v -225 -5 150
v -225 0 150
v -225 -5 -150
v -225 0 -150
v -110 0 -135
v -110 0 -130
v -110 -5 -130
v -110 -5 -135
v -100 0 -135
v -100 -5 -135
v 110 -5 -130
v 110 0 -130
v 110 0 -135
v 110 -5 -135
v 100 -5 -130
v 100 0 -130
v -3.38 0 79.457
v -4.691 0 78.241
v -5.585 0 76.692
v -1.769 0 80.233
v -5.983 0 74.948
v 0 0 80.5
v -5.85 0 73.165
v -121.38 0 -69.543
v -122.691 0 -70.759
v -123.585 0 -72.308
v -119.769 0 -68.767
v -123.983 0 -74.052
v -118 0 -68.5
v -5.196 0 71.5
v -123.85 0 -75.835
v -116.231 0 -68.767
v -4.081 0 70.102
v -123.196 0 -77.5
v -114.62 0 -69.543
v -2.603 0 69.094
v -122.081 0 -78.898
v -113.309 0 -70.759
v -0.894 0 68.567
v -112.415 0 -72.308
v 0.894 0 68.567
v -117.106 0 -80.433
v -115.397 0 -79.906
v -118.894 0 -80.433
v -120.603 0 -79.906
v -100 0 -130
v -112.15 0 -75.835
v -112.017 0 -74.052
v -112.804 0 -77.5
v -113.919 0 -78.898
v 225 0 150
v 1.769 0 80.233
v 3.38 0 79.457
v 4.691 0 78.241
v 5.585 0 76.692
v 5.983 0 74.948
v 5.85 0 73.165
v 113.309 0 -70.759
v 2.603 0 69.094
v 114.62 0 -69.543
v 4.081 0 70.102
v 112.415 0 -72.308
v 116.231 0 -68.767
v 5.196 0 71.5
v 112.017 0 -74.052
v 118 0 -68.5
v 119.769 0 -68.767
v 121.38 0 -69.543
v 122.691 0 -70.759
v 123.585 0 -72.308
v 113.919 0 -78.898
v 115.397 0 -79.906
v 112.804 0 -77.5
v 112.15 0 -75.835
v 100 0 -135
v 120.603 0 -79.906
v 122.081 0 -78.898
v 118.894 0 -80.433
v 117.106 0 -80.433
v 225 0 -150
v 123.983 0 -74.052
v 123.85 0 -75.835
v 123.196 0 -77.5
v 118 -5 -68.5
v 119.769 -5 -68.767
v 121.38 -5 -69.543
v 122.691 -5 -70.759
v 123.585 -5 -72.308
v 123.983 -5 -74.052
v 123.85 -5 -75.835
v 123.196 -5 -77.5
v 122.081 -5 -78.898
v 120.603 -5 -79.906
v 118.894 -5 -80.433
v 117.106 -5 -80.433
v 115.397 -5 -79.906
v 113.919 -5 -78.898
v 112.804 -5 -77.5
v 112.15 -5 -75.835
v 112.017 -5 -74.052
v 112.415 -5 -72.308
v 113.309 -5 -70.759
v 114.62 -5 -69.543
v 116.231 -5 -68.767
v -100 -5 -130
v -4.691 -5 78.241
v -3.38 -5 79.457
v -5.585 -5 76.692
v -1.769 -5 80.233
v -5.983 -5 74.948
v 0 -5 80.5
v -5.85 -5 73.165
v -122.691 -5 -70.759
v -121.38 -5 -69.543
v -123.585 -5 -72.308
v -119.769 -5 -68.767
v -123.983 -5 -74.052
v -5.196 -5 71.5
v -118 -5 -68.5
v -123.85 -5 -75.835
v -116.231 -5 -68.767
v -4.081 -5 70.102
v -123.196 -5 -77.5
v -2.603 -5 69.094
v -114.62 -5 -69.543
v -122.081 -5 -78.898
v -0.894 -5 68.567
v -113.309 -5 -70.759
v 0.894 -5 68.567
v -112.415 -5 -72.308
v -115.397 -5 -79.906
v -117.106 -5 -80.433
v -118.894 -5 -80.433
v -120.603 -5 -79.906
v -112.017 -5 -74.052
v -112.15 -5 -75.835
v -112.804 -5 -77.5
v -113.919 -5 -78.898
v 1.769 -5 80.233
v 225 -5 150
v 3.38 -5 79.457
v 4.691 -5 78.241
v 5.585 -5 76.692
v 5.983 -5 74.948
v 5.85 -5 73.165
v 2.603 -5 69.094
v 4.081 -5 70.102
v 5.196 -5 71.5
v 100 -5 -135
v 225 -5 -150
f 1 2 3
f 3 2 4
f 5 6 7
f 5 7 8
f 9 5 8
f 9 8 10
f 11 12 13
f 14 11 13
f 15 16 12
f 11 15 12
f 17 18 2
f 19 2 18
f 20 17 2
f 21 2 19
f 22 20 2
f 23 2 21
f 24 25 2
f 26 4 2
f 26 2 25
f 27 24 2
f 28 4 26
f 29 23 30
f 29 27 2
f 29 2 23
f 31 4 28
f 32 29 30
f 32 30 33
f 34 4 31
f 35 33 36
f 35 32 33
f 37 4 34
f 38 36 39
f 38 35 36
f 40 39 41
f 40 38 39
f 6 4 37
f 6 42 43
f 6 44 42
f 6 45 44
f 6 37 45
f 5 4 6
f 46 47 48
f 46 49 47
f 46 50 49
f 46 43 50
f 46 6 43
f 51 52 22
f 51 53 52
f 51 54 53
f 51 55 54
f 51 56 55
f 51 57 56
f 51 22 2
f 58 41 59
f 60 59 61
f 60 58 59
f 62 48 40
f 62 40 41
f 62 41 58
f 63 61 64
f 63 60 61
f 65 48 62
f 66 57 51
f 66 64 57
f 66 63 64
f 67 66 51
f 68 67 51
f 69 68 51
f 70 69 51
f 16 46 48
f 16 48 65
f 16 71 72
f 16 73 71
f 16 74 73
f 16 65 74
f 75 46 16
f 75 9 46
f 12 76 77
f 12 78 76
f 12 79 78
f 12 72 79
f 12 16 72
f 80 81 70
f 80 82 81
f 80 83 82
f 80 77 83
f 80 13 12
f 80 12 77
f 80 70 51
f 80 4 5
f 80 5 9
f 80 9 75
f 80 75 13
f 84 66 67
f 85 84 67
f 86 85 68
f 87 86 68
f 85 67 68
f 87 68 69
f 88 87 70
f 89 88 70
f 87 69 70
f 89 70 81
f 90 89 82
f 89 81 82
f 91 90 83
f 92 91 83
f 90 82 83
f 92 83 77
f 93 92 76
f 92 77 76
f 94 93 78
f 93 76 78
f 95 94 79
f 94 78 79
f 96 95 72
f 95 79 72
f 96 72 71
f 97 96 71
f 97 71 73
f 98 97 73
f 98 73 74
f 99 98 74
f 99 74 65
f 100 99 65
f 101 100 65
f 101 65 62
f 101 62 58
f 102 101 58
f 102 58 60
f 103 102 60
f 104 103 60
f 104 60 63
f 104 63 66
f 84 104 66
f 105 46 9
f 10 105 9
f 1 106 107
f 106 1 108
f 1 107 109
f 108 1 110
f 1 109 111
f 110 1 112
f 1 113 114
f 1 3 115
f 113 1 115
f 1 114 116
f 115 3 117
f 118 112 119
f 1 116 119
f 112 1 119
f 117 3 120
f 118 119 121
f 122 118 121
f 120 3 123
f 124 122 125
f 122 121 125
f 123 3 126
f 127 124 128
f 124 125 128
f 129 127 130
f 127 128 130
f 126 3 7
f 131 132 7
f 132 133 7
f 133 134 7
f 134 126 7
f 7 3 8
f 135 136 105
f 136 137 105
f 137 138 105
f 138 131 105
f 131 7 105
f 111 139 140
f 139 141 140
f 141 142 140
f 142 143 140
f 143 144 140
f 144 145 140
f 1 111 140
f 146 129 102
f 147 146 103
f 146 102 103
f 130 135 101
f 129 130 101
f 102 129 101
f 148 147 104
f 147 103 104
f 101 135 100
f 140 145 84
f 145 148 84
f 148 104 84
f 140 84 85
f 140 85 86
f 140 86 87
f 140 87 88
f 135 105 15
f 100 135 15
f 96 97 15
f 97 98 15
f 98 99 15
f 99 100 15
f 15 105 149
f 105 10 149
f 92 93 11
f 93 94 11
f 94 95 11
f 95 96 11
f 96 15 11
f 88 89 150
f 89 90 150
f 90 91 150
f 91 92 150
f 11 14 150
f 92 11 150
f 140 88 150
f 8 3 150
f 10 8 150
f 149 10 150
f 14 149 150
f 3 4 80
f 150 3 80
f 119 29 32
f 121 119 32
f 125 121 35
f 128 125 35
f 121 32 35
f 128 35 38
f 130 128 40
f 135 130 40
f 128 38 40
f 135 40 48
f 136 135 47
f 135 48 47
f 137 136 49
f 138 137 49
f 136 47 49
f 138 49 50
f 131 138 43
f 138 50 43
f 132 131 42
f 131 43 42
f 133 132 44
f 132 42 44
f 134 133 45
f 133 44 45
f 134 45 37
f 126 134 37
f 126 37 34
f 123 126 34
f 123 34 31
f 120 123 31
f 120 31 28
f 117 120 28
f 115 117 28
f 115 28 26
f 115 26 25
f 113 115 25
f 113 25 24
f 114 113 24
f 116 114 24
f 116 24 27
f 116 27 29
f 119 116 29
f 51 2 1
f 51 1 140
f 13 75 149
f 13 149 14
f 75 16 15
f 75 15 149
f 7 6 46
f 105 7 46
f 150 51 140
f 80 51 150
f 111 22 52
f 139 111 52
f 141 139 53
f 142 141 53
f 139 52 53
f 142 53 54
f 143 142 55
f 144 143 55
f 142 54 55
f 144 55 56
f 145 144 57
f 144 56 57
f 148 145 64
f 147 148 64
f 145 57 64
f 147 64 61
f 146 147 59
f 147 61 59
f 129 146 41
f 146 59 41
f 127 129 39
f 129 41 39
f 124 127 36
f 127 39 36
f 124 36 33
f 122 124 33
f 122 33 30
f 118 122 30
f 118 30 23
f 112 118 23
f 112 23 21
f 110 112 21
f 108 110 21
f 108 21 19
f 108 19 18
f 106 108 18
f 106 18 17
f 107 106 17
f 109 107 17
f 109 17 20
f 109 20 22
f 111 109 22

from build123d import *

# Parameters (mm, degrees)
SKETCH1_W      = 450
SKETCH1_H      = 300
EXTRUDE1_DEPTH = 5
EXTRUDE2_REACH = 272.463
SKETCH2_R      = 6
EXTRUDE3_REACH = 272.463
SKETCH3_W      = 10
SKETCH3_H      = 5


with BuildPart() as part:
    # Sketch1 → Extrude1 (new body)
    with BuildSketch(Plane(origin=(0, 0, 0), x_dir=(1, 0, 0), z_dir=(0, 1, 0))):
        Rectangle(SKETCH1_W, SKETCH1_H)
    extrude(amount=-EXTRUDE1_DEPTH)

    # Sketch2 → Extrude2 (cut, up to next)
    with BuildSketch(Plane(origin=(0, 0, 0), x_dir=(1, 0, 0), z_dir=(0, 1, 0)), mode=Mode.PRIVATE) as extrude2_sk1:
        with Locations(Location((0, -74.5, 0), (0, 0, 270))):
            Circle(SKETCH2_R)
    extrude2_tool1 = extrude(extrude2_sk1.sketch, amount=-EXTRUDE2_REACH, mode=Mode.PRIVATE) & part.part
    # Sketch2 → Extrude2 (cut, up to next)
    with BuildSketch(Plane(origin=(0, 0, 0), x_dir=(1, 0, 0), z_dir=(0, 1, 0)), mode=Mode.PRIVATE) as extrude2_sk2:
        with Locations(Location((118, 74.5, 0), (0, 0, 270))):
            Circle(SKETCH2_R)
    extrude2_tool2 = extrude(extrude2_sk2.sketch, amount=-EXTRUDE2_REACH, mode=Mode.PRIVATE) & part.part
    # Sketch2 → Extrude2 (cut, up to next)
    with BuildSketch(Plane(origin=(0, 0, 0), x_dir=(1, 0, 0), z_dir=(0, 1, 0)), mode=Mode.PRIVATE) as extrude2_sk3:
        with Locations(Location((-118, 74.5, 0), (0, 0, 270))):
            Circle(SKETCH2_R)
    extrude2_tool3 = extrude(extrude2_sk3.sketch, amount=-EXTRUDE2_REACH, mode=Mode.PRIVATE) & part.part
    add(extrude2_tool1.solids().sort_by_distance((0, 0, 74.5))[0], mode=Mode.SUBTRACT)
    add(extrude2_tool2.solids().sort_by_distance((118, 0, -74.5))[0], mode=Mode.SUBTRACT)
    add(extrude2_tool3.solids().sort_by_distance((-118, 0, -74.5))[0], mode=Mode.SUBTRACT)

    # Sketch3 → Extrude3 (cut, up to next)
    with BuildSketch(Plane(origin=(0, 0, 0), x_dir=(1, 0, 0), z_dir=(0, 1, 0)), mode=Mode.PRIVATE) as extrude3_sk1:
        with Locations((-105, 132.5)):
            Rectangle(SKETCH3_W, SKETCH3_H)
    extrude3_tool1 = extrude(extrude3_sk1.sketch, amount=-EXTRUDE3_REACH, mode=Mode.PRIVATE) & part.part
    # Sketch3 → Extrude3 (cut, up to next)
    with BuildSketch(Plane(origin=(0, 0, 0), x_dir=(1, 0, 0), z_dir=(0, 1, 0)), mode=Mode.PRIVATE) as extrude3_sk2:
        with Locations((105, 132.5)):
            Rectangle(SKETCH3_W, SKETCH3_H)
    extrude3_tool2 = extrude(extrude3_sk2.sketch, amount=-EXTRUDE3_REACH, mode=Mode.PRIVATE) & part.part
    add(extrude3_tool1.solids().sort_by_distance((-105, 0, -132.5))[0], mode=Mode.SUBTRACT)
    add(extrude3_tool2.solids().sort_by_distance((105, 0, -132.5))[0], mode=Mode.SUBTRACT)


solid = part.part
